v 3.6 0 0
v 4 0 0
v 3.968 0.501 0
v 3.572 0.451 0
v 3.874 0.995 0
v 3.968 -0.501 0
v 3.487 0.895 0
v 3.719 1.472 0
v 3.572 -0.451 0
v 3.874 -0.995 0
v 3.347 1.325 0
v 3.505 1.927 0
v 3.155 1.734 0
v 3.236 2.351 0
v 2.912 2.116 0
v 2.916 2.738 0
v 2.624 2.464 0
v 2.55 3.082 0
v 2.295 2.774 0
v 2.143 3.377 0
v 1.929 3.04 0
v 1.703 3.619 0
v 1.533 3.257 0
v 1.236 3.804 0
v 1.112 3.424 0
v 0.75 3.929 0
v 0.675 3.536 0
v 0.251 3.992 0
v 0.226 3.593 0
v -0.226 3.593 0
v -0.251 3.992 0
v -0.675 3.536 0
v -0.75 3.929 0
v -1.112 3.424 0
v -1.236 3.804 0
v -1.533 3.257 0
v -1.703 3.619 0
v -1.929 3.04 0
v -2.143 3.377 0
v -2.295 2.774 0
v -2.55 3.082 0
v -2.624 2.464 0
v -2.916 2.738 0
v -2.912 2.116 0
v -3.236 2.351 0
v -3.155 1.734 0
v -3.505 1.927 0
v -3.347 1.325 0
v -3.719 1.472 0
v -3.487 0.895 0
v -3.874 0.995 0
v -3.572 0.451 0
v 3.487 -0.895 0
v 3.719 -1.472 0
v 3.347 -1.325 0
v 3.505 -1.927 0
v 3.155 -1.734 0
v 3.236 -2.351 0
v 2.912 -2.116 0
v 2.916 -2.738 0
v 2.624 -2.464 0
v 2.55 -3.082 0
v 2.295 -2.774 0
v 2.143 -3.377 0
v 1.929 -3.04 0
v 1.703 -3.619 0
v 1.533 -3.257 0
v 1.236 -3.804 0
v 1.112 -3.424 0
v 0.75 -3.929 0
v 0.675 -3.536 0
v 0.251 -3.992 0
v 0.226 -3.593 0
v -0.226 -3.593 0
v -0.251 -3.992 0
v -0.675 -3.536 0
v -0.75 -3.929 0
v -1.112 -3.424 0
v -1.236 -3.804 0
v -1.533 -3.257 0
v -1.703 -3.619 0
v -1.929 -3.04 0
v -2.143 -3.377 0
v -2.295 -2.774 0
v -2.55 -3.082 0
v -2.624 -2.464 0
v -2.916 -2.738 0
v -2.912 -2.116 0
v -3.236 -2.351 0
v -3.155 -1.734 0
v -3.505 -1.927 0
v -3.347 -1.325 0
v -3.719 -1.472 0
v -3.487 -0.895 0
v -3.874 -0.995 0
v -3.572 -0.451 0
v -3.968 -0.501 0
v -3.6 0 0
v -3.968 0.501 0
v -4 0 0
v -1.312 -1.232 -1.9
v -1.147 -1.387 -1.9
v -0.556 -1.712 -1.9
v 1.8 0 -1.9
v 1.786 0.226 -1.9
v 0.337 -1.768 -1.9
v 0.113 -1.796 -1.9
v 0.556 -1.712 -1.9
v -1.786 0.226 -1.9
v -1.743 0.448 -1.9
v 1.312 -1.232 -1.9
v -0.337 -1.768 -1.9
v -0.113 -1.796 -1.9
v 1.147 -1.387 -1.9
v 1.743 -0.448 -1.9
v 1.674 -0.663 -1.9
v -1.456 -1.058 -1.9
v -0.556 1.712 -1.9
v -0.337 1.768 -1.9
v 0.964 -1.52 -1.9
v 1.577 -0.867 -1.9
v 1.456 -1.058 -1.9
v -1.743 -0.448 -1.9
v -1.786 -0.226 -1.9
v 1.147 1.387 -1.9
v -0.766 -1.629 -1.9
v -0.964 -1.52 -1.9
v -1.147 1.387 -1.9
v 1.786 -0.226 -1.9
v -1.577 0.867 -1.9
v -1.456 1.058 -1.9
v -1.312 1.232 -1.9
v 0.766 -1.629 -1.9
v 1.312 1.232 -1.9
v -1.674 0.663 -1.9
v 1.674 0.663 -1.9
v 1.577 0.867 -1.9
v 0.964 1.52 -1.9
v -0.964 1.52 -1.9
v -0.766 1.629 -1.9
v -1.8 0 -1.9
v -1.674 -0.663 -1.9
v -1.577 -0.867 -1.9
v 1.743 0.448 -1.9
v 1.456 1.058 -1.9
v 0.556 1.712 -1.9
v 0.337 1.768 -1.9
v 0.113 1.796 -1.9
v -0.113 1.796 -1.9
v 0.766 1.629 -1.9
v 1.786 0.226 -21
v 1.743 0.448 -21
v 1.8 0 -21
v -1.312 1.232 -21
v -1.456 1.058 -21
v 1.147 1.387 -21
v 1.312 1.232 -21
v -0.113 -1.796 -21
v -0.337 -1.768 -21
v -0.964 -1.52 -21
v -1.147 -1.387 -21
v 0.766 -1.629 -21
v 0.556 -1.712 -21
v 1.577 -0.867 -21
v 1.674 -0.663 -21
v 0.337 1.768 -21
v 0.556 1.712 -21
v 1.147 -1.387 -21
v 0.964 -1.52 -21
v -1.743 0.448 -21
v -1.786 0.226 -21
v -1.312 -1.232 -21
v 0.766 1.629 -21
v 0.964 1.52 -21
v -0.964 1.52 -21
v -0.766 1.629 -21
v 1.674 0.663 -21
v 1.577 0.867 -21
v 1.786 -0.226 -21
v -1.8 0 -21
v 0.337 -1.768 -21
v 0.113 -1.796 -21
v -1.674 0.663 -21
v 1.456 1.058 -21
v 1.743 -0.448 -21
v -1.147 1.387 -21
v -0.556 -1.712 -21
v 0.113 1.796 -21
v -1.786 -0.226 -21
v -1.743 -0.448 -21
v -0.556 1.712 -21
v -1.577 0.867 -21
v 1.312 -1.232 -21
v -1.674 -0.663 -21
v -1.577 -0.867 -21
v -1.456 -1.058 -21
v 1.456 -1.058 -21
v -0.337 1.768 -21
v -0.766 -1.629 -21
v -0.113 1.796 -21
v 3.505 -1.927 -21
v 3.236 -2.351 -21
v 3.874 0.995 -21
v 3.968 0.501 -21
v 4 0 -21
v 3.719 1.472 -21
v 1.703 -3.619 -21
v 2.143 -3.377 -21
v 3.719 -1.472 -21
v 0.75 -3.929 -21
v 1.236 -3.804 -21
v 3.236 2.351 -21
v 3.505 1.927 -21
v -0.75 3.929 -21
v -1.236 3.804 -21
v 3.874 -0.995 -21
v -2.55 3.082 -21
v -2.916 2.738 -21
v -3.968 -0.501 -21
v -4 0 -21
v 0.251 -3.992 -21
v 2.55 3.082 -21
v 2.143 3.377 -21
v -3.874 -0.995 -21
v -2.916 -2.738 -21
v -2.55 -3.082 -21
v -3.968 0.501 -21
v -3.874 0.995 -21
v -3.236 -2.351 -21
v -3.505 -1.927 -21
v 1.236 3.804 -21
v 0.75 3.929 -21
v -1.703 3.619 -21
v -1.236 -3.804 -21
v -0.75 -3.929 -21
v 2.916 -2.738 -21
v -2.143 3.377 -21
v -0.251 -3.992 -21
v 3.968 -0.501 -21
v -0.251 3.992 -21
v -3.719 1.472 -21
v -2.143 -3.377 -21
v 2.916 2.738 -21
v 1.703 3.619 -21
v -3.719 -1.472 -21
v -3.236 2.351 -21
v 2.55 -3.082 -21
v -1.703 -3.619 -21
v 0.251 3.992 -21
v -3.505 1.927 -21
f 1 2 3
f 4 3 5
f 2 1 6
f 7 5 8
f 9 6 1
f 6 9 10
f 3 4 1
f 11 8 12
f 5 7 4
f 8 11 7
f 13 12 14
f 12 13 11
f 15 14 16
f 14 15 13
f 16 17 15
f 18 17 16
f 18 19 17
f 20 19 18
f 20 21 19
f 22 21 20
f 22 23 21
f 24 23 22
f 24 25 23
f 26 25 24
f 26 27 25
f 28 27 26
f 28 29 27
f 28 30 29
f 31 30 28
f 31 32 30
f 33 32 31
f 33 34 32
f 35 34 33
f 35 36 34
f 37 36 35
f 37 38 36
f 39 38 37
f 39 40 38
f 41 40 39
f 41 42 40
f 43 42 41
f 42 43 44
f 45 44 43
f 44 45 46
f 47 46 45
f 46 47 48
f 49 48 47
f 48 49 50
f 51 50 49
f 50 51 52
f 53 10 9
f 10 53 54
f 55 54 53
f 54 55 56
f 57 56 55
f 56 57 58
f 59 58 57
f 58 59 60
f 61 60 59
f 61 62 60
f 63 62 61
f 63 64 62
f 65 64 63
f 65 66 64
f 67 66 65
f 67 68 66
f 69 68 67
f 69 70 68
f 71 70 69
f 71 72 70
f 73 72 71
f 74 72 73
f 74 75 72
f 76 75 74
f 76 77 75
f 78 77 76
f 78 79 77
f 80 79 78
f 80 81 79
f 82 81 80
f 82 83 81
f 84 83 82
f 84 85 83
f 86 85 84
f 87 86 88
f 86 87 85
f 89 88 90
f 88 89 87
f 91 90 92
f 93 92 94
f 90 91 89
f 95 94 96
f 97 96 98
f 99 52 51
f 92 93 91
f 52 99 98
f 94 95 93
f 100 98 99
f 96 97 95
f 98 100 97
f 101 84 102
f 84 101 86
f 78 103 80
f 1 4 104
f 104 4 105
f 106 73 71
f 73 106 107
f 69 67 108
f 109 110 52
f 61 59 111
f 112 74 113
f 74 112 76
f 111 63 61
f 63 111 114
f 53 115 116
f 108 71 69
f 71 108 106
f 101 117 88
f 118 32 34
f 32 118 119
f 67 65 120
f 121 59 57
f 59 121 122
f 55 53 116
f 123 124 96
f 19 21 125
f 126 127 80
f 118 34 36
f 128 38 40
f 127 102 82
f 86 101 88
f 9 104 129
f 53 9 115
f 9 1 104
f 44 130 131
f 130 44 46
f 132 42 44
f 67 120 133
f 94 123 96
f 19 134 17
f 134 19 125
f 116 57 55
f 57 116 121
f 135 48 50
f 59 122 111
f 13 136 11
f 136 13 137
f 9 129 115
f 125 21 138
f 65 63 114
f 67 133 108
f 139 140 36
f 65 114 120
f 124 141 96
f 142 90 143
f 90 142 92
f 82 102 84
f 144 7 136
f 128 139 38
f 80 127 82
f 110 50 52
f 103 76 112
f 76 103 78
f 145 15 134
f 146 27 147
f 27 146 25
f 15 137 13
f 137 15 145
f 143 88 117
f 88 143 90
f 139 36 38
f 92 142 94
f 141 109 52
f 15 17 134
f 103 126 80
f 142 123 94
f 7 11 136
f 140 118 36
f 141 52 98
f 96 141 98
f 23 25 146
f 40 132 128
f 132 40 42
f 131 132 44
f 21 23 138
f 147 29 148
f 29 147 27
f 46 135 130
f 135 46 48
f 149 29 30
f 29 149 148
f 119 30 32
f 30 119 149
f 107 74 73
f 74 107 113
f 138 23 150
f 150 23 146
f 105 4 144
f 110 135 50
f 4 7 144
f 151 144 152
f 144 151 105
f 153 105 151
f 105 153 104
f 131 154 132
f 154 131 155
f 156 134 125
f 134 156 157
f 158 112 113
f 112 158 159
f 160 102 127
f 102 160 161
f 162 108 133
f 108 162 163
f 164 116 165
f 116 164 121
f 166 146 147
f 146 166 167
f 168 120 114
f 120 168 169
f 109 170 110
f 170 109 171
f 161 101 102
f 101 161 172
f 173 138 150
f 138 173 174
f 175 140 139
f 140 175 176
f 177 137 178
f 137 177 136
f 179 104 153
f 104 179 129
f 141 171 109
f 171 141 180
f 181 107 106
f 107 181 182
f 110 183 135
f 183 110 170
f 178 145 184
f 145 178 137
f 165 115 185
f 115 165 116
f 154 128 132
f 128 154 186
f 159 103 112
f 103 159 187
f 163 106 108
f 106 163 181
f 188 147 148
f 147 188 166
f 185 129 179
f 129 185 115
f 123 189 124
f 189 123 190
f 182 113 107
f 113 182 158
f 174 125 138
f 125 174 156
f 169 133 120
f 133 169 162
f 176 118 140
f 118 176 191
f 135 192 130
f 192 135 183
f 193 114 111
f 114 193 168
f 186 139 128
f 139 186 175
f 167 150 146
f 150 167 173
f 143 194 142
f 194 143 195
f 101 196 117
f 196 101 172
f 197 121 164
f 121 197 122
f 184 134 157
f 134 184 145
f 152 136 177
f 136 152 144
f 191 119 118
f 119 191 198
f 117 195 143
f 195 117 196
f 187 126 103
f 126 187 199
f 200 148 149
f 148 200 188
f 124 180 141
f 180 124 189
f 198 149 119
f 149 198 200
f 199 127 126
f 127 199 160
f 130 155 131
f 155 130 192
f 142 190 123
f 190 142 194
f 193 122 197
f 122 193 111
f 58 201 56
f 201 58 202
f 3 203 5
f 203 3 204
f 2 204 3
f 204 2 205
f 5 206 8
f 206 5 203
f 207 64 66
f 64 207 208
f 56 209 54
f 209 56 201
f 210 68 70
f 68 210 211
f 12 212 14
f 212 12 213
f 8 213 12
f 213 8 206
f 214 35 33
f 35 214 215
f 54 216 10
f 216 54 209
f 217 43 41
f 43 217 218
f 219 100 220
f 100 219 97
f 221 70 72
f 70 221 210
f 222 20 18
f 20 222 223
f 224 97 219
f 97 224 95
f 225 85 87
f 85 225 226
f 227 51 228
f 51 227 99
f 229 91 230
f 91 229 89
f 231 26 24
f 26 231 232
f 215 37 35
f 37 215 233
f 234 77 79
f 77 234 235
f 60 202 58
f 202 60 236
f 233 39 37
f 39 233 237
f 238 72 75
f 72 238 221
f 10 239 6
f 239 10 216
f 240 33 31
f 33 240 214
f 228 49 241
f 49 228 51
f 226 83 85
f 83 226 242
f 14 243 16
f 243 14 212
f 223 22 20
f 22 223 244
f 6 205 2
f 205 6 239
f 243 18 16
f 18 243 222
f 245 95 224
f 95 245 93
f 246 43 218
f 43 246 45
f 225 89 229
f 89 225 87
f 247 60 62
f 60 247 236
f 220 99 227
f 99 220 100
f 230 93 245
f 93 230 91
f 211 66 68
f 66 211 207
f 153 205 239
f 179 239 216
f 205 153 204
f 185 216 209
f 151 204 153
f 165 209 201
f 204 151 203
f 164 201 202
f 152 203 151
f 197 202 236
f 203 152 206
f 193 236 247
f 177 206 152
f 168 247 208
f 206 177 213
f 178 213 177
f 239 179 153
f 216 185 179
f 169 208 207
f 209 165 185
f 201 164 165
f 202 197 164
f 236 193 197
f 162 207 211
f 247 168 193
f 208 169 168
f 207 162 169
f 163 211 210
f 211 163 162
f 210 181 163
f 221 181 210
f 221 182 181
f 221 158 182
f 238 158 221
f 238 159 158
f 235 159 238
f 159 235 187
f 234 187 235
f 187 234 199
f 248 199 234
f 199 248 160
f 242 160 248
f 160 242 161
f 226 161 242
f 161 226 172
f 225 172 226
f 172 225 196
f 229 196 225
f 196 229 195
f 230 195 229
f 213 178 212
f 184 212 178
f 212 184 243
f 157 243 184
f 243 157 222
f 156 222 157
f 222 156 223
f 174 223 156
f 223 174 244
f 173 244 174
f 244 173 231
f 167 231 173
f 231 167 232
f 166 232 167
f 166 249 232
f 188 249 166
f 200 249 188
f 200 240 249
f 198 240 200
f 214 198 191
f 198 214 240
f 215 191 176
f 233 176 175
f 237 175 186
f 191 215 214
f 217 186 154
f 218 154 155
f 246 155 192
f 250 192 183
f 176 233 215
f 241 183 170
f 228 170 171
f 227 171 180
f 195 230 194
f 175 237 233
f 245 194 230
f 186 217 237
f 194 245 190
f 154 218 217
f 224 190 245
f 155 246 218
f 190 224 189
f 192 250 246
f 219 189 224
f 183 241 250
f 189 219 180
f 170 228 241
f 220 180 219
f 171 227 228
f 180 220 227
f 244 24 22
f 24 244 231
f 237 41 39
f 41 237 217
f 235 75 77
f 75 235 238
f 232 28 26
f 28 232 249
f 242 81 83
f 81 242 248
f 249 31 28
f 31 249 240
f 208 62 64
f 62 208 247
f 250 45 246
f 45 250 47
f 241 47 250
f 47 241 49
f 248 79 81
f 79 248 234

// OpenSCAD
$fn = 50;

difference() {
	union() {
		translate(v = [0, 0, -21.0]) {
			cylinder(h = 24, r = 4.0);
		}
	}
	union() {
		translate(v = [0, 0, 0]) {
			rotate(a = [0, 0, 0]) {
				difference() {
					union() {
						translate(v = [0, 0, -24.0]) {
							cylinder(h = 24, r = 1.5);
						}
						translate(v = [0, 0, -1.9]) {
							cylinder(h = 1.9, r1 = 1.8, r2 = 3.6);
						}
						translate(v = [0, 0, -24.0]) {
							cylinder(h = 24, r = 1.8);
						}
						translate(v = [0, 0, -24.0]) {
							cylinder(h = 24, r = 1.5);
						}
					}
					union();
				}
			}
		}
		#cylinder(h = 3, r = 5.0);
	}
}
